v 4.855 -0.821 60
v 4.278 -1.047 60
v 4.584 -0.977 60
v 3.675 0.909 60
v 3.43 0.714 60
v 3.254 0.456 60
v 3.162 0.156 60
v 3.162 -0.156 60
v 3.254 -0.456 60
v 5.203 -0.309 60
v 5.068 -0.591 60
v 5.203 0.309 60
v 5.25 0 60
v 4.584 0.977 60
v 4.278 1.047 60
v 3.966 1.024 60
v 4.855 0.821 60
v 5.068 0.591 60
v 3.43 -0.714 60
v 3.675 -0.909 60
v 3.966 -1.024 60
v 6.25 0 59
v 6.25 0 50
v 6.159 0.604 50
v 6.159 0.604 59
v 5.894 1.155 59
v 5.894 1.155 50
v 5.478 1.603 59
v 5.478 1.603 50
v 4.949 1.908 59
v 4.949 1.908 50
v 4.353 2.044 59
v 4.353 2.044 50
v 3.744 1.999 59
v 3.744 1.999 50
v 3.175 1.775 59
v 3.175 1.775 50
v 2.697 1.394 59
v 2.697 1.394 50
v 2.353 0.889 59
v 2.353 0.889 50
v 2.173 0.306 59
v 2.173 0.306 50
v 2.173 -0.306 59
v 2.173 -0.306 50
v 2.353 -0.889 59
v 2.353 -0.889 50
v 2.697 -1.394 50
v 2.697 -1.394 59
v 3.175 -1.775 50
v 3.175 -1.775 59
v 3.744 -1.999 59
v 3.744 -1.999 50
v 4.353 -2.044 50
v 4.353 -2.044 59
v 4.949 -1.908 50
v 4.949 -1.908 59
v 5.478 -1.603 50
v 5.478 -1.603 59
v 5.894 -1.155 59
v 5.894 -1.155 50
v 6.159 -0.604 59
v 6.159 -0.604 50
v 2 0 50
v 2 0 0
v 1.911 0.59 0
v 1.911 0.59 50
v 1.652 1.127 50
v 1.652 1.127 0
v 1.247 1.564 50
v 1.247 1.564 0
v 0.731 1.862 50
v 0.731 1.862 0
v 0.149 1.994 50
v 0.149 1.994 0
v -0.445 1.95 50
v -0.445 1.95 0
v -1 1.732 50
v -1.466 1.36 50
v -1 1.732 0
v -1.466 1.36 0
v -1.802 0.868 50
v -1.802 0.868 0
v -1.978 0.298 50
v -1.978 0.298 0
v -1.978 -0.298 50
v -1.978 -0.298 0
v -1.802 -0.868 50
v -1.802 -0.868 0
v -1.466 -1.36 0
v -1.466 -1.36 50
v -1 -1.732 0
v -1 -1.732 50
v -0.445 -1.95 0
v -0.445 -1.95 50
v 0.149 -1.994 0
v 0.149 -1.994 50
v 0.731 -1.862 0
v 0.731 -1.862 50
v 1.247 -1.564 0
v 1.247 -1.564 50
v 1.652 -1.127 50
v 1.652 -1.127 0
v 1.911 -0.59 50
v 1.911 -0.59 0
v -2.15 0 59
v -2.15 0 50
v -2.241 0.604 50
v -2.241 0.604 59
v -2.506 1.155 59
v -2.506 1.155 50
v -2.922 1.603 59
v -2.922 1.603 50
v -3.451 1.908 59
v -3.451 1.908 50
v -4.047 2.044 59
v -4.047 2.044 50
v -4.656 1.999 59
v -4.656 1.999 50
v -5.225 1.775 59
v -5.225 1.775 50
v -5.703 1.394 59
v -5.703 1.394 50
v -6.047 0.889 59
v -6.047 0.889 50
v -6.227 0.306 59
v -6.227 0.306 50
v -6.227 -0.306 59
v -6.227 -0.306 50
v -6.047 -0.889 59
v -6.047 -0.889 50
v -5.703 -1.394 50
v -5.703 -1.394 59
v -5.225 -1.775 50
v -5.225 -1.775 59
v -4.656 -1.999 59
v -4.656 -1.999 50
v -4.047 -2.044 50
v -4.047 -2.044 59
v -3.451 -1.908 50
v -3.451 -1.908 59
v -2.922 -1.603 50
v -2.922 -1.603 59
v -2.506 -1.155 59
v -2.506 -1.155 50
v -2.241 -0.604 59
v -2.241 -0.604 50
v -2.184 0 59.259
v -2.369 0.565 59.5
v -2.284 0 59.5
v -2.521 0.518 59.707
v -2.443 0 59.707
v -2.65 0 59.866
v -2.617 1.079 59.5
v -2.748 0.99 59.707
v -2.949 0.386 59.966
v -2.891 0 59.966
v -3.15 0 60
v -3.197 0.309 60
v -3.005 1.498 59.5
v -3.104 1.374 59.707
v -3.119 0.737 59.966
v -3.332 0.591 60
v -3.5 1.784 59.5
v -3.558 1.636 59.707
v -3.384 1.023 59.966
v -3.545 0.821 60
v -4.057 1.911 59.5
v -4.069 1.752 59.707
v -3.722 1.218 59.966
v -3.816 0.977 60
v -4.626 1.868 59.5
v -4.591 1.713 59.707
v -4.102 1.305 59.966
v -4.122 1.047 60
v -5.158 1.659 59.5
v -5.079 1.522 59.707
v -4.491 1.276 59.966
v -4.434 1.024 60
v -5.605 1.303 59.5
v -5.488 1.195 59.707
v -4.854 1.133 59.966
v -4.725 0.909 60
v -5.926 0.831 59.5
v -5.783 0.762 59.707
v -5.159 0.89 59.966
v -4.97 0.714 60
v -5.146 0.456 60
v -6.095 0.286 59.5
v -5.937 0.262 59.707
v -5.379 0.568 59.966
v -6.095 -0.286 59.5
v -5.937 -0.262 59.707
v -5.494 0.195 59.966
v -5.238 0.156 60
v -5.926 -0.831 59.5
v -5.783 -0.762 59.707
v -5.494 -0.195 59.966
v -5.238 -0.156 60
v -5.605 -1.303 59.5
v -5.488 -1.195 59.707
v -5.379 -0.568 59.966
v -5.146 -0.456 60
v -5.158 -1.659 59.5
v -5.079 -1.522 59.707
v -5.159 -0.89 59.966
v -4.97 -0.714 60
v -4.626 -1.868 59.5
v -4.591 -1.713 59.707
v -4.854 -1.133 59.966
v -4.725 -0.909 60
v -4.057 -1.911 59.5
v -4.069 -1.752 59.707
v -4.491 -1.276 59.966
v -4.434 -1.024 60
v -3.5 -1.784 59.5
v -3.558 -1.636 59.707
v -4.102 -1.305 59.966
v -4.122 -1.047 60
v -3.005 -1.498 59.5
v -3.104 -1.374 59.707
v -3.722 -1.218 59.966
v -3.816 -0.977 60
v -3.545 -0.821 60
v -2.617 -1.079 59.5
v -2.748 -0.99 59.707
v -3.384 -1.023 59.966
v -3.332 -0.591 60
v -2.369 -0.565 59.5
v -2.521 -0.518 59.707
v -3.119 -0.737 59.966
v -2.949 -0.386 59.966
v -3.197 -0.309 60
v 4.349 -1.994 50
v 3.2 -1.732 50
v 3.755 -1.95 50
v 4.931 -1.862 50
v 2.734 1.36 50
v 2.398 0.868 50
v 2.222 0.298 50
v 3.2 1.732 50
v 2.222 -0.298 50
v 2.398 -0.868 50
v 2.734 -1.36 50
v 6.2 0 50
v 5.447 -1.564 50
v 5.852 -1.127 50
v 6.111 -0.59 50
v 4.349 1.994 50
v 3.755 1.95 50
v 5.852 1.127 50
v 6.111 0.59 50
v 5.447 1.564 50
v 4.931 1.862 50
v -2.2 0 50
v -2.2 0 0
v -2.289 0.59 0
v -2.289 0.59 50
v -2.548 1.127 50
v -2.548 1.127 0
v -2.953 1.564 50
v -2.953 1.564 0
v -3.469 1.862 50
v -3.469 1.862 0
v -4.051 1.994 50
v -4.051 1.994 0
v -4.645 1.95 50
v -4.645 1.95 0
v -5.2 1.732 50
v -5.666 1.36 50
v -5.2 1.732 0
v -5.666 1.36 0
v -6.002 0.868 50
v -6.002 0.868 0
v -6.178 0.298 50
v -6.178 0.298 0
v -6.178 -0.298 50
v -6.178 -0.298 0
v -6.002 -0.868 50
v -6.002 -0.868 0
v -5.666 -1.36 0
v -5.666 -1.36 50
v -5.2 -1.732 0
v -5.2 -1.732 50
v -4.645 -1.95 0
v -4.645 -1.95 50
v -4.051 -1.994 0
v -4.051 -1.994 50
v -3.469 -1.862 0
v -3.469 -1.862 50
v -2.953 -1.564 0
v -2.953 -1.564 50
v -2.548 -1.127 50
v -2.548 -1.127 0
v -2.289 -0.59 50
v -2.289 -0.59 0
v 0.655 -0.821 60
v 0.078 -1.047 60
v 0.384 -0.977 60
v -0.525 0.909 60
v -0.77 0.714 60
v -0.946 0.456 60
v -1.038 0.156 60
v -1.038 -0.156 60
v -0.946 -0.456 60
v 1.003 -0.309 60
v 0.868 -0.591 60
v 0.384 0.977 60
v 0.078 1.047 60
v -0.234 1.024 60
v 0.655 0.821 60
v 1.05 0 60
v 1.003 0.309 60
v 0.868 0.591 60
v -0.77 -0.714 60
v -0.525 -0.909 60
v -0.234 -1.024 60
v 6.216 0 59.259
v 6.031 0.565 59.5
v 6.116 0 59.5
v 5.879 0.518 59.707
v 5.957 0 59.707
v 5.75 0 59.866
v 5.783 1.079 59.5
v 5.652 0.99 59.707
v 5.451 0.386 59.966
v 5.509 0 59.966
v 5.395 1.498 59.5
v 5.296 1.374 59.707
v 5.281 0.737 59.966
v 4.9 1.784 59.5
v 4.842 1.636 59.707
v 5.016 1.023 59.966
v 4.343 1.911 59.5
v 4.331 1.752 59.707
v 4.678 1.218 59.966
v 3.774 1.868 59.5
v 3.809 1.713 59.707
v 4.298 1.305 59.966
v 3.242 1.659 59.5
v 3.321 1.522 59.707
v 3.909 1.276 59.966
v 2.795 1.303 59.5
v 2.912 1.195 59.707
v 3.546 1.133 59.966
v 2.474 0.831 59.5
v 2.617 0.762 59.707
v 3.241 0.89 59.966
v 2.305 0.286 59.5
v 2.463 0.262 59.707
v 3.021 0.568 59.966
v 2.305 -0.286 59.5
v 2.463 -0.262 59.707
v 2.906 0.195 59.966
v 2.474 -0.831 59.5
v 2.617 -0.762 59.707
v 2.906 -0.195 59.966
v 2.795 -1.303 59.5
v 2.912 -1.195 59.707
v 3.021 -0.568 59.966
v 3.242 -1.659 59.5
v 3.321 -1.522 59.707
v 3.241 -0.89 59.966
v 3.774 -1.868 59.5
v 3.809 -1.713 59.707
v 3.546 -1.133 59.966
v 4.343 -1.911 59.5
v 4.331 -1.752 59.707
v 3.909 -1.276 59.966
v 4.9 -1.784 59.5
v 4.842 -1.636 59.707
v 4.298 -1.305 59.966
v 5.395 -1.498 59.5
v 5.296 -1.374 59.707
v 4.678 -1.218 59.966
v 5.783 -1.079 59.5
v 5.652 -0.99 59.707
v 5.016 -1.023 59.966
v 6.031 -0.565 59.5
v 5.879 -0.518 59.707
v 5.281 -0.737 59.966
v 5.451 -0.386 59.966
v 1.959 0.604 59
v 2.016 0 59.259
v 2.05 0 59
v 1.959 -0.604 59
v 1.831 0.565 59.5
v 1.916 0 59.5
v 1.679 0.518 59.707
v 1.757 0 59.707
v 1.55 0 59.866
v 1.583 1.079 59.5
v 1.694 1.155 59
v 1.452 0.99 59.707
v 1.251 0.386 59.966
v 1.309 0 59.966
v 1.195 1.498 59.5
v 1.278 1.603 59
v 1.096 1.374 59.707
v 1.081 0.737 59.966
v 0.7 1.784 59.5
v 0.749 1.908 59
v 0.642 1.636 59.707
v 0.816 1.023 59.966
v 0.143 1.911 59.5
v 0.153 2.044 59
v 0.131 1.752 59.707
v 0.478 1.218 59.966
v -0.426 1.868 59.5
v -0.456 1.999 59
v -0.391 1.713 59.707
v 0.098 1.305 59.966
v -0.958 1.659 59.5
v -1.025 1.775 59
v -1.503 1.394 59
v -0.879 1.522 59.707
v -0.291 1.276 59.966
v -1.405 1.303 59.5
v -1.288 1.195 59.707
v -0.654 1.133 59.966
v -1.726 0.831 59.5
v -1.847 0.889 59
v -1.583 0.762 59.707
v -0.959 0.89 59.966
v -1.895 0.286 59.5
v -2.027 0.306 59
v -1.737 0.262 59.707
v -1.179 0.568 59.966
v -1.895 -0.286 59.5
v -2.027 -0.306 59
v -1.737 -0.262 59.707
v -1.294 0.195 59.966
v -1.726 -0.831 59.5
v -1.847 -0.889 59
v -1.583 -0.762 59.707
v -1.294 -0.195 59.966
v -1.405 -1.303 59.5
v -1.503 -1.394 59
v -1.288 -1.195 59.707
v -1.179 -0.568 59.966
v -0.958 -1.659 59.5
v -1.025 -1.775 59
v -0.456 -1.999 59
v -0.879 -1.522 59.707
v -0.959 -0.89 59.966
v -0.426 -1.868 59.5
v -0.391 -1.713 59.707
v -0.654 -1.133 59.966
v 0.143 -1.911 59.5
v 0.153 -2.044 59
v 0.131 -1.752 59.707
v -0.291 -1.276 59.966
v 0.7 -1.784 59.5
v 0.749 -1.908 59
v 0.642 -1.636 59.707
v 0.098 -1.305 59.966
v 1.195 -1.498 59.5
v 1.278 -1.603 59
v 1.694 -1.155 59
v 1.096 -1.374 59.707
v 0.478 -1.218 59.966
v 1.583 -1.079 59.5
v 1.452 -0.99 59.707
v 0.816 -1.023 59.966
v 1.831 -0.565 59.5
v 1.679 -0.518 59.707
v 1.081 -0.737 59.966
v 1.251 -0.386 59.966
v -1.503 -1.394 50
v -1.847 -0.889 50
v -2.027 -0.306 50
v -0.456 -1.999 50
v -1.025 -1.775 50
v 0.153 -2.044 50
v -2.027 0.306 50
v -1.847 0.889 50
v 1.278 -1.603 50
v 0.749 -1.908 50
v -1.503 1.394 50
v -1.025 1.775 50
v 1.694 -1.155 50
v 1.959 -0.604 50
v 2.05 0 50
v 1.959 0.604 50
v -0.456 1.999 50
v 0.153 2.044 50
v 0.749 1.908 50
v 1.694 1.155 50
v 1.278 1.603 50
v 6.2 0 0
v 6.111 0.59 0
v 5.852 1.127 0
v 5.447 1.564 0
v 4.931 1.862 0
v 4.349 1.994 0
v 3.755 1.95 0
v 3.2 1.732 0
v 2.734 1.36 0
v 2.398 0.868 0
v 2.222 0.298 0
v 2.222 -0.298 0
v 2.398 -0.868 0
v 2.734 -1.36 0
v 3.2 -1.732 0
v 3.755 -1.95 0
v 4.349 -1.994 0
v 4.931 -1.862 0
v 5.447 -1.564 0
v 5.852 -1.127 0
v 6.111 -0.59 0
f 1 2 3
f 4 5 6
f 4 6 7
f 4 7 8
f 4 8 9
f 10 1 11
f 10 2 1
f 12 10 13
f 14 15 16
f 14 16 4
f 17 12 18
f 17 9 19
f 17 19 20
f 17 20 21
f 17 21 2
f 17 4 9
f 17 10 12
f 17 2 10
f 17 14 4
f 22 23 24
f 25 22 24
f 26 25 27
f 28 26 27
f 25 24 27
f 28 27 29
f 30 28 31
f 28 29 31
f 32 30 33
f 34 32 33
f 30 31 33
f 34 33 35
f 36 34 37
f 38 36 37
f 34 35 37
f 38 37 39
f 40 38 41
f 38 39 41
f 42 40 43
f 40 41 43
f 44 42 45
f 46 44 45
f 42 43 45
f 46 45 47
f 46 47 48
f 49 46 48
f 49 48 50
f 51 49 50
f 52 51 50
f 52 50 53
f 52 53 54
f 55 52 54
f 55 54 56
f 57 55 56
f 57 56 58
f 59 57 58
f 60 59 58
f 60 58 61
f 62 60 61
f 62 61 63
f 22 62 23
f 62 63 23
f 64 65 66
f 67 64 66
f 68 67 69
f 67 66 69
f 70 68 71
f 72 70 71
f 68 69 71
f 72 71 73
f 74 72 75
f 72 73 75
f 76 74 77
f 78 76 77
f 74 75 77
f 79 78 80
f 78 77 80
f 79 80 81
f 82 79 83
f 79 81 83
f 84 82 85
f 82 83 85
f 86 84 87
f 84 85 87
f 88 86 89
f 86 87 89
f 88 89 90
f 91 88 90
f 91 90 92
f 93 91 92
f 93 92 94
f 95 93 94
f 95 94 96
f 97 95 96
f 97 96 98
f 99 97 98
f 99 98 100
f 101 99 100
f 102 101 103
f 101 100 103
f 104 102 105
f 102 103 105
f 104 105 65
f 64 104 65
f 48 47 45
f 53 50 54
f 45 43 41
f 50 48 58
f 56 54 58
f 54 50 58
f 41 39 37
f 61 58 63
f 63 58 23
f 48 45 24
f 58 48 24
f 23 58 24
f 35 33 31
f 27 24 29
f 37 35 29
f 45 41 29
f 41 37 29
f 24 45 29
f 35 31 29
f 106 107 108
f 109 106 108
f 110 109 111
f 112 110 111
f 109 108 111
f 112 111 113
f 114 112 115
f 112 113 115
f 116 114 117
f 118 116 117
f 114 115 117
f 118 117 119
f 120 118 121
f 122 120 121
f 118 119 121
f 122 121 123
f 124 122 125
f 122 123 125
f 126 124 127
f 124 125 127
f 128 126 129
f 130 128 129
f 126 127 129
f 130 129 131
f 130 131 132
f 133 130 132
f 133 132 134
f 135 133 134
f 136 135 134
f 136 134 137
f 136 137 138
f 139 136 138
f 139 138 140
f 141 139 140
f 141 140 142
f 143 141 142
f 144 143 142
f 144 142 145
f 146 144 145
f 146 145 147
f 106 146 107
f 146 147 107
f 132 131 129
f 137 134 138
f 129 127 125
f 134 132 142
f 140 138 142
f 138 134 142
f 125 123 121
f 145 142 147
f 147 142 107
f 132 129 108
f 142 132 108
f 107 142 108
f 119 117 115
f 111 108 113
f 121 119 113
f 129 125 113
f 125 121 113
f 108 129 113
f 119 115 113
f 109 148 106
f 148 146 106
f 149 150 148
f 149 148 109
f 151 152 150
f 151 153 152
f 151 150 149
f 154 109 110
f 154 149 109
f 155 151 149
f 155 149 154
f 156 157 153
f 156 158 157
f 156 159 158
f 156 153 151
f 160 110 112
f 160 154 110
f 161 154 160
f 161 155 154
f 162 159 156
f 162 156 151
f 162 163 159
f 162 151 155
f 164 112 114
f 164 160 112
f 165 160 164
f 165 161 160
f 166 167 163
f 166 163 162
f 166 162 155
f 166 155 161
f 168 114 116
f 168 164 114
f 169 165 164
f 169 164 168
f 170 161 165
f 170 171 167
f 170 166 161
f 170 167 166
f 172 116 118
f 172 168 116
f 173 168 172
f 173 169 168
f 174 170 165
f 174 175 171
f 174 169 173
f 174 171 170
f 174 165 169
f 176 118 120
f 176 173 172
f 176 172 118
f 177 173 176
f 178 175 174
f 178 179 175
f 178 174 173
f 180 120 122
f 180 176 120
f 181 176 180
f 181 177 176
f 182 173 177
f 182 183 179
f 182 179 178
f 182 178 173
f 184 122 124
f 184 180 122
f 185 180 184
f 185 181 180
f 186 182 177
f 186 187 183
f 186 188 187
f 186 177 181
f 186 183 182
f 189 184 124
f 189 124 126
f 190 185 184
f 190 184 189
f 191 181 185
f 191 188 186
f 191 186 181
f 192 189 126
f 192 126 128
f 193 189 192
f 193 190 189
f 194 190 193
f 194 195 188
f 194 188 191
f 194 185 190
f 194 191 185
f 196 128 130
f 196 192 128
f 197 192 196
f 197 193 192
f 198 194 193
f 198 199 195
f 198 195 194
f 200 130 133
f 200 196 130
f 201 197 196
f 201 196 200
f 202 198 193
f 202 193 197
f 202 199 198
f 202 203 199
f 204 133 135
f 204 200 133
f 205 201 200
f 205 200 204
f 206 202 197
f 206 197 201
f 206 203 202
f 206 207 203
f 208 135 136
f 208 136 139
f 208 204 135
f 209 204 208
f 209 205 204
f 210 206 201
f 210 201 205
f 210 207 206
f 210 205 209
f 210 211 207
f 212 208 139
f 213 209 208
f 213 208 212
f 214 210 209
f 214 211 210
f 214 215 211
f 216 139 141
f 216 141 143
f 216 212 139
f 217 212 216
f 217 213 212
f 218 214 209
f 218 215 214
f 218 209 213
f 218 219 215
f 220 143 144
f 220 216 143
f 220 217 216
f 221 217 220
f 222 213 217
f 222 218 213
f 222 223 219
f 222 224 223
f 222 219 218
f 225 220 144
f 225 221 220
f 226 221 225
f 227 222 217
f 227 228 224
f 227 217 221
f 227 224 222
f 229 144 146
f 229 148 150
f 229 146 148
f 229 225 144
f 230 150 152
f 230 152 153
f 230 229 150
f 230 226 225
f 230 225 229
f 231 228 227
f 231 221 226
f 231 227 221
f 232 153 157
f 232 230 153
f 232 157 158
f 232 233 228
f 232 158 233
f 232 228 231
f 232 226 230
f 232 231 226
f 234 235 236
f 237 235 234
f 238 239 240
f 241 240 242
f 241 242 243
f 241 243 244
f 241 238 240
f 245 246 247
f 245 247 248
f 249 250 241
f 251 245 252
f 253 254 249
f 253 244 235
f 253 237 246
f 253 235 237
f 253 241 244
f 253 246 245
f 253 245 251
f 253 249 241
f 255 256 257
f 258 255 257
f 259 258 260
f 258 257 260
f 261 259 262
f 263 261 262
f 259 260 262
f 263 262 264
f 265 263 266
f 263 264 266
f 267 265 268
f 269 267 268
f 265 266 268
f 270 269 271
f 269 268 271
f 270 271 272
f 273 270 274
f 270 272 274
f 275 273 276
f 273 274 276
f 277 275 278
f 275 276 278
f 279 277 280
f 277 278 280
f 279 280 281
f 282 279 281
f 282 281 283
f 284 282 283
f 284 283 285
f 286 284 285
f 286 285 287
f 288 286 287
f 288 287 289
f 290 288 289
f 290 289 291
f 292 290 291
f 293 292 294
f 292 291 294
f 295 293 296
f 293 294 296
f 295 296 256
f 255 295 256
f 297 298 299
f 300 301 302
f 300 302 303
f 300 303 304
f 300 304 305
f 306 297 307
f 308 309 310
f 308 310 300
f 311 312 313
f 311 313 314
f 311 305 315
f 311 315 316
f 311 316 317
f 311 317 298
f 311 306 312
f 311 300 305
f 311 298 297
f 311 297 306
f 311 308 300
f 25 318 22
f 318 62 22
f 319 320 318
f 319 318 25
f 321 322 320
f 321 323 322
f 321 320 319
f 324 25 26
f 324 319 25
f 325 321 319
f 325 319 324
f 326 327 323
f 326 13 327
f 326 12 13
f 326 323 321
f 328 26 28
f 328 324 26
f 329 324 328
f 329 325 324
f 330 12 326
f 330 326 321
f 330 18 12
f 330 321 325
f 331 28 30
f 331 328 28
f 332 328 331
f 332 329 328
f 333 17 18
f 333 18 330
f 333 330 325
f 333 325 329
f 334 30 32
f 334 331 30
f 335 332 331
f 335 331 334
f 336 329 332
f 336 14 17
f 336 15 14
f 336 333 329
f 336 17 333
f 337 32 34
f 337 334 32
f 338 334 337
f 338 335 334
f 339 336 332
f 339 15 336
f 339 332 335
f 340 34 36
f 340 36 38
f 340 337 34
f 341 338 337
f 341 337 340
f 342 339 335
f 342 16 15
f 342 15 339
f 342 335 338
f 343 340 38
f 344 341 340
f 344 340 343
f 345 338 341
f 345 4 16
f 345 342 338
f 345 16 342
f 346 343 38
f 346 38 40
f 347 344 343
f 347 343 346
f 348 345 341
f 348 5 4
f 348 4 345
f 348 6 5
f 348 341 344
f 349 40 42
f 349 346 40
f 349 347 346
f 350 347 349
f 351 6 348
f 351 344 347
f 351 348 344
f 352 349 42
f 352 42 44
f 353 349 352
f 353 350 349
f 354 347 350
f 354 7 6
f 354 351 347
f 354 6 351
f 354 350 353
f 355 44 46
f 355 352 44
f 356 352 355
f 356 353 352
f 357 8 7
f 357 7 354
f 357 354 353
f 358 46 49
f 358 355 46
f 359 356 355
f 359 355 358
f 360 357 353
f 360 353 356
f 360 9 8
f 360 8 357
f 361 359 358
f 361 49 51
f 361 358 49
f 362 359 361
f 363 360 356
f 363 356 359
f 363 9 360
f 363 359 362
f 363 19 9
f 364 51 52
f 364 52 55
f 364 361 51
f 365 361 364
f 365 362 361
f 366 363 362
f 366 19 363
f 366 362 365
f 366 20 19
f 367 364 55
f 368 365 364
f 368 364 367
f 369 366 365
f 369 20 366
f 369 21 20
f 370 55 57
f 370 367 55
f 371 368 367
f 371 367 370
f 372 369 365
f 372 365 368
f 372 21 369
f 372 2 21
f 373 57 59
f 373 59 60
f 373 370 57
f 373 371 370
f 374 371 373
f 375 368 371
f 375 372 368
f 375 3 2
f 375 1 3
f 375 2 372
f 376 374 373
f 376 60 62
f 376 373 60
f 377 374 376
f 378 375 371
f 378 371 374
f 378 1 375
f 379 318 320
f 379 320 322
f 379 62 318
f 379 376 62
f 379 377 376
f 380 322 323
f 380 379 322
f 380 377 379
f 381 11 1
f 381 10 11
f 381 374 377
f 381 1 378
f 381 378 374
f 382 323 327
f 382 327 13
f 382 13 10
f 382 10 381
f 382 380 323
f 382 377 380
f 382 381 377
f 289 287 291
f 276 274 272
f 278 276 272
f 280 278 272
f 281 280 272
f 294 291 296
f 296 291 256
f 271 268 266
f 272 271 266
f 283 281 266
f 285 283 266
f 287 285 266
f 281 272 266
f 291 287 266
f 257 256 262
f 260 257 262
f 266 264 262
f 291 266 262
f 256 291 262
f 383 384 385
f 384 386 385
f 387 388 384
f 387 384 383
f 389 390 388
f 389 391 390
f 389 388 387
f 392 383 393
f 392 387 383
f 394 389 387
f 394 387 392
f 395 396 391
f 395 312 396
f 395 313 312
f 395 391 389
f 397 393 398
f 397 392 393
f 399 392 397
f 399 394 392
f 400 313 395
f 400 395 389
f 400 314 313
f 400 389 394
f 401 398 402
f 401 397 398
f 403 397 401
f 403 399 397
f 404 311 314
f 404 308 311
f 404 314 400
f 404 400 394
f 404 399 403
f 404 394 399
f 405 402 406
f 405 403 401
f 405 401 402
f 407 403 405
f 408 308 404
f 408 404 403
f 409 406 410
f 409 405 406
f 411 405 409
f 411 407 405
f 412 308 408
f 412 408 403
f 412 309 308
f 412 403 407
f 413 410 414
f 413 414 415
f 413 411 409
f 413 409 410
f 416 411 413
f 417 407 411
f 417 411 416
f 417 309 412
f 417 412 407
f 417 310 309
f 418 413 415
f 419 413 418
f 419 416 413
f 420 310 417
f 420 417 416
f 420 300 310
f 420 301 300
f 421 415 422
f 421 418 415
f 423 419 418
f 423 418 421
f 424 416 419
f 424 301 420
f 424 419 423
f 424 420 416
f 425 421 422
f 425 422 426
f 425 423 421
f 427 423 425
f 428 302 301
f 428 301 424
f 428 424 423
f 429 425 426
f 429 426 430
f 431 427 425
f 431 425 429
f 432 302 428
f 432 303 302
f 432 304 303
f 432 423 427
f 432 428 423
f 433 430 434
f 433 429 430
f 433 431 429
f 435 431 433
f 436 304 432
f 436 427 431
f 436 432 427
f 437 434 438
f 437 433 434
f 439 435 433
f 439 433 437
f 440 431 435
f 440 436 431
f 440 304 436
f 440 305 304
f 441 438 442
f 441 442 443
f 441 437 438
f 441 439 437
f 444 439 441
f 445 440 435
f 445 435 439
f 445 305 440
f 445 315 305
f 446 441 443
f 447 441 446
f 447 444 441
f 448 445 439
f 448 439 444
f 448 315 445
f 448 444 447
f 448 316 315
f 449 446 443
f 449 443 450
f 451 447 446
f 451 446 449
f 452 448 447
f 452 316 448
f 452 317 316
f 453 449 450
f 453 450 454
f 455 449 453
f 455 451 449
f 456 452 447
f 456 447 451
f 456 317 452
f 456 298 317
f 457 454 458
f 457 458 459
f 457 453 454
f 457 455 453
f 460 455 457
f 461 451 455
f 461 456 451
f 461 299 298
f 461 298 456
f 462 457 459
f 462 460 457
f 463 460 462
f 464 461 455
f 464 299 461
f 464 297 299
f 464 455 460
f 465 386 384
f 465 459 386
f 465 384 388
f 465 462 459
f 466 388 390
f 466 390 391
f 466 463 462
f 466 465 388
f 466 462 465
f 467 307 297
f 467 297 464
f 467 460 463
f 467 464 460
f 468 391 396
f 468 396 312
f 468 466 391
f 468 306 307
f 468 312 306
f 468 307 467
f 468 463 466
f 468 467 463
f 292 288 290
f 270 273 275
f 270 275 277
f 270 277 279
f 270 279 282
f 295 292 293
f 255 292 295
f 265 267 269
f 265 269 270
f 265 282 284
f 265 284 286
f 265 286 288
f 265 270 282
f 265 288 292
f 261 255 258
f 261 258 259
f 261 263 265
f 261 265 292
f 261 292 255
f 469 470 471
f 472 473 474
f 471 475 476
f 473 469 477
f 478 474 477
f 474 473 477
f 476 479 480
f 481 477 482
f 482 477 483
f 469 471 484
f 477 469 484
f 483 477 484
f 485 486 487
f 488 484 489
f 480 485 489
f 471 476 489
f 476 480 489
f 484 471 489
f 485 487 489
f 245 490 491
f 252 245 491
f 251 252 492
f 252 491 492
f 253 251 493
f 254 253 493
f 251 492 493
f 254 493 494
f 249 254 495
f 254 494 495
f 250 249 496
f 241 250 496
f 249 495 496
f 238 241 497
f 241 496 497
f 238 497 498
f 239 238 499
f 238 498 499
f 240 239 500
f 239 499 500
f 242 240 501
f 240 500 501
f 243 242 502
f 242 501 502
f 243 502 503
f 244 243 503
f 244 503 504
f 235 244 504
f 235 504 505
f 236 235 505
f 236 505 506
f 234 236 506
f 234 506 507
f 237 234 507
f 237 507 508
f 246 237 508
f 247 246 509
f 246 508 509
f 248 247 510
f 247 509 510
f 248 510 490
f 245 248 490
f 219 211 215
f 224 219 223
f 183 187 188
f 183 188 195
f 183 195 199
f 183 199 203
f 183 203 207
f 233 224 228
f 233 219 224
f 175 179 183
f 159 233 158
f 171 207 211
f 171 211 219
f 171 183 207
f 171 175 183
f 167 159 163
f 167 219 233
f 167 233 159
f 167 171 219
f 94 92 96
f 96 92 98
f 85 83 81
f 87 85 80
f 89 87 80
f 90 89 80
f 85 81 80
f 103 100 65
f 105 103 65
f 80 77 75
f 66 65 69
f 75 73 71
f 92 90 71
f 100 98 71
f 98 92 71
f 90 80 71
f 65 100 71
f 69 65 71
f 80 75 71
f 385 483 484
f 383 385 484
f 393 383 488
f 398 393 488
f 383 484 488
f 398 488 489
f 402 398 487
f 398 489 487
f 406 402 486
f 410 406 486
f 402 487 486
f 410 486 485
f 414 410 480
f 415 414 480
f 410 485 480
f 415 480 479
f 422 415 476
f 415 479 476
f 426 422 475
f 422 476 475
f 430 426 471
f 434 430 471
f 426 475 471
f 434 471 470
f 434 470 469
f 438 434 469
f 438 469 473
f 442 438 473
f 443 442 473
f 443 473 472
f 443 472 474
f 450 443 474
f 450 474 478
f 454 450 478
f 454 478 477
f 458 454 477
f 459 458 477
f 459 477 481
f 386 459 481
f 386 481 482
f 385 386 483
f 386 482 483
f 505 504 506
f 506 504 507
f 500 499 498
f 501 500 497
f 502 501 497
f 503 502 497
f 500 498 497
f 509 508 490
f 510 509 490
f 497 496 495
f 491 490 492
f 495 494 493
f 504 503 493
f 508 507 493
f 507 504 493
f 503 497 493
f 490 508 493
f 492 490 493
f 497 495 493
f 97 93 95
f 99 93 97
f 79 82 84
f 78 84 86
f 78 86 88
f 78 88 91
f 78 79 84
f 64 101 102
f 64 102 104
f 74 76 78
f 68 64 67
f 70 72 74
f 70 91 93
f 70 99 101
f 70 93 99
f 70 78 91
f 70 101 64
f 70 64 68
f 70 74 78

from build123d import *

# Parameters (mm, degrees)
SKETCH_1_R        = 2
EXTRUDE_1_DEPTH   = 50
EXTRUDE_1_2_DEPTH = 50
EXTRUDE_1_3_DEPTH = 50
SKETCH_2_R        = 2.05
EXTRUDE_2_DEPTH   = 10
EXTRUDE_2_2_DEPTH = 10
EXTRUDE_2_3_DEPTH = 10
FILLET_1_R        = 1
FILLET_2_R        = 1
FILLET_3_R        = 1


with BuildPart() as part:
    # Эскиз1 → Бобышка-Вытянуть1 (new body)
    with BuildSketch(Plane.XY):
        Circle(SKETCH_1_R)
    extrude(amount=EXTRUDE_1_DEPTH)


with BuildPart() as body_2:
    # Эскиз1 → Extrude 1 2 (new body)
    with BuildSketch(Plane.XY):
        with Locations((4.2, 0)):
            Circle(SKETCH_1_R)
    extrude(amount=EXTRUDE_1_2_DEPTH)


with BuildPart() as body_3:
    # Эскиз1 → Extrude 1 3 (new body)
    with BuildSketch(Plane.XY):
        with Locations((-4.2, 0)):
            Circle(SKETCH_1_R)
    extrude(amount=EXTRUDE_1_3_DEPTH)


with BuildPart() as body_4:
    # Эскиз2 → Бобышка-Вытянуть2 (new body)
    with BuildSketch(Plane.XY.offset(50)):
        Circle(SKETCH_2_R)
    extrude(amount=EXTRUDE_2_DEPTH)

    # Скругление2
    fillet_2_edges = [body_4.edges().sort_by_distance(p)[0] for p in [
        (-2.05, 0, 60),
    ]]
    fillet(fillet_2_edges, radius=FILLET_2_R)


with BuildPart() as body_5:
    # Эскиз2 → Extrude 2 2 (new body)
    with BuildSketch(Plane.XY.offset(50)):
        with Locations((4.2, 0)):
            Circle(SKETCH_2_R)
    extrude(amount=EXTRUDE_2_2_DEPTH)

    # Скругление3
    fillet_3_edges = [body_5.edges().sort_by_distance(p)[0] for p in [
        (2.15, 0, 60),
    ]]
    fillet(fillet_3_edges, radius=FILLET_3_R)


with BuildPart() as body_6:
    # Эскиз2 → Extrude 2 3 (new body)
    with BuildSketch(Plane.XY.offset(50)):
        with Locations((-4.2, 0)):
            Circle(SKETCH_2_R)
    extrude(amount=EXTRUDE_2_3_DEPTH)

    # Скругление1
    fillet_1_edges = [body_6.edges().sort_by_distance(p)[0] for p in [
        (-6.25, 0, 60),
    ]]
    fillet(fillet_1_edges, radius=FILLET_1_R)


solid = Compound([part.part, body_2.part, body_3.part, body_4.part, body_5.part, body_6.part])
